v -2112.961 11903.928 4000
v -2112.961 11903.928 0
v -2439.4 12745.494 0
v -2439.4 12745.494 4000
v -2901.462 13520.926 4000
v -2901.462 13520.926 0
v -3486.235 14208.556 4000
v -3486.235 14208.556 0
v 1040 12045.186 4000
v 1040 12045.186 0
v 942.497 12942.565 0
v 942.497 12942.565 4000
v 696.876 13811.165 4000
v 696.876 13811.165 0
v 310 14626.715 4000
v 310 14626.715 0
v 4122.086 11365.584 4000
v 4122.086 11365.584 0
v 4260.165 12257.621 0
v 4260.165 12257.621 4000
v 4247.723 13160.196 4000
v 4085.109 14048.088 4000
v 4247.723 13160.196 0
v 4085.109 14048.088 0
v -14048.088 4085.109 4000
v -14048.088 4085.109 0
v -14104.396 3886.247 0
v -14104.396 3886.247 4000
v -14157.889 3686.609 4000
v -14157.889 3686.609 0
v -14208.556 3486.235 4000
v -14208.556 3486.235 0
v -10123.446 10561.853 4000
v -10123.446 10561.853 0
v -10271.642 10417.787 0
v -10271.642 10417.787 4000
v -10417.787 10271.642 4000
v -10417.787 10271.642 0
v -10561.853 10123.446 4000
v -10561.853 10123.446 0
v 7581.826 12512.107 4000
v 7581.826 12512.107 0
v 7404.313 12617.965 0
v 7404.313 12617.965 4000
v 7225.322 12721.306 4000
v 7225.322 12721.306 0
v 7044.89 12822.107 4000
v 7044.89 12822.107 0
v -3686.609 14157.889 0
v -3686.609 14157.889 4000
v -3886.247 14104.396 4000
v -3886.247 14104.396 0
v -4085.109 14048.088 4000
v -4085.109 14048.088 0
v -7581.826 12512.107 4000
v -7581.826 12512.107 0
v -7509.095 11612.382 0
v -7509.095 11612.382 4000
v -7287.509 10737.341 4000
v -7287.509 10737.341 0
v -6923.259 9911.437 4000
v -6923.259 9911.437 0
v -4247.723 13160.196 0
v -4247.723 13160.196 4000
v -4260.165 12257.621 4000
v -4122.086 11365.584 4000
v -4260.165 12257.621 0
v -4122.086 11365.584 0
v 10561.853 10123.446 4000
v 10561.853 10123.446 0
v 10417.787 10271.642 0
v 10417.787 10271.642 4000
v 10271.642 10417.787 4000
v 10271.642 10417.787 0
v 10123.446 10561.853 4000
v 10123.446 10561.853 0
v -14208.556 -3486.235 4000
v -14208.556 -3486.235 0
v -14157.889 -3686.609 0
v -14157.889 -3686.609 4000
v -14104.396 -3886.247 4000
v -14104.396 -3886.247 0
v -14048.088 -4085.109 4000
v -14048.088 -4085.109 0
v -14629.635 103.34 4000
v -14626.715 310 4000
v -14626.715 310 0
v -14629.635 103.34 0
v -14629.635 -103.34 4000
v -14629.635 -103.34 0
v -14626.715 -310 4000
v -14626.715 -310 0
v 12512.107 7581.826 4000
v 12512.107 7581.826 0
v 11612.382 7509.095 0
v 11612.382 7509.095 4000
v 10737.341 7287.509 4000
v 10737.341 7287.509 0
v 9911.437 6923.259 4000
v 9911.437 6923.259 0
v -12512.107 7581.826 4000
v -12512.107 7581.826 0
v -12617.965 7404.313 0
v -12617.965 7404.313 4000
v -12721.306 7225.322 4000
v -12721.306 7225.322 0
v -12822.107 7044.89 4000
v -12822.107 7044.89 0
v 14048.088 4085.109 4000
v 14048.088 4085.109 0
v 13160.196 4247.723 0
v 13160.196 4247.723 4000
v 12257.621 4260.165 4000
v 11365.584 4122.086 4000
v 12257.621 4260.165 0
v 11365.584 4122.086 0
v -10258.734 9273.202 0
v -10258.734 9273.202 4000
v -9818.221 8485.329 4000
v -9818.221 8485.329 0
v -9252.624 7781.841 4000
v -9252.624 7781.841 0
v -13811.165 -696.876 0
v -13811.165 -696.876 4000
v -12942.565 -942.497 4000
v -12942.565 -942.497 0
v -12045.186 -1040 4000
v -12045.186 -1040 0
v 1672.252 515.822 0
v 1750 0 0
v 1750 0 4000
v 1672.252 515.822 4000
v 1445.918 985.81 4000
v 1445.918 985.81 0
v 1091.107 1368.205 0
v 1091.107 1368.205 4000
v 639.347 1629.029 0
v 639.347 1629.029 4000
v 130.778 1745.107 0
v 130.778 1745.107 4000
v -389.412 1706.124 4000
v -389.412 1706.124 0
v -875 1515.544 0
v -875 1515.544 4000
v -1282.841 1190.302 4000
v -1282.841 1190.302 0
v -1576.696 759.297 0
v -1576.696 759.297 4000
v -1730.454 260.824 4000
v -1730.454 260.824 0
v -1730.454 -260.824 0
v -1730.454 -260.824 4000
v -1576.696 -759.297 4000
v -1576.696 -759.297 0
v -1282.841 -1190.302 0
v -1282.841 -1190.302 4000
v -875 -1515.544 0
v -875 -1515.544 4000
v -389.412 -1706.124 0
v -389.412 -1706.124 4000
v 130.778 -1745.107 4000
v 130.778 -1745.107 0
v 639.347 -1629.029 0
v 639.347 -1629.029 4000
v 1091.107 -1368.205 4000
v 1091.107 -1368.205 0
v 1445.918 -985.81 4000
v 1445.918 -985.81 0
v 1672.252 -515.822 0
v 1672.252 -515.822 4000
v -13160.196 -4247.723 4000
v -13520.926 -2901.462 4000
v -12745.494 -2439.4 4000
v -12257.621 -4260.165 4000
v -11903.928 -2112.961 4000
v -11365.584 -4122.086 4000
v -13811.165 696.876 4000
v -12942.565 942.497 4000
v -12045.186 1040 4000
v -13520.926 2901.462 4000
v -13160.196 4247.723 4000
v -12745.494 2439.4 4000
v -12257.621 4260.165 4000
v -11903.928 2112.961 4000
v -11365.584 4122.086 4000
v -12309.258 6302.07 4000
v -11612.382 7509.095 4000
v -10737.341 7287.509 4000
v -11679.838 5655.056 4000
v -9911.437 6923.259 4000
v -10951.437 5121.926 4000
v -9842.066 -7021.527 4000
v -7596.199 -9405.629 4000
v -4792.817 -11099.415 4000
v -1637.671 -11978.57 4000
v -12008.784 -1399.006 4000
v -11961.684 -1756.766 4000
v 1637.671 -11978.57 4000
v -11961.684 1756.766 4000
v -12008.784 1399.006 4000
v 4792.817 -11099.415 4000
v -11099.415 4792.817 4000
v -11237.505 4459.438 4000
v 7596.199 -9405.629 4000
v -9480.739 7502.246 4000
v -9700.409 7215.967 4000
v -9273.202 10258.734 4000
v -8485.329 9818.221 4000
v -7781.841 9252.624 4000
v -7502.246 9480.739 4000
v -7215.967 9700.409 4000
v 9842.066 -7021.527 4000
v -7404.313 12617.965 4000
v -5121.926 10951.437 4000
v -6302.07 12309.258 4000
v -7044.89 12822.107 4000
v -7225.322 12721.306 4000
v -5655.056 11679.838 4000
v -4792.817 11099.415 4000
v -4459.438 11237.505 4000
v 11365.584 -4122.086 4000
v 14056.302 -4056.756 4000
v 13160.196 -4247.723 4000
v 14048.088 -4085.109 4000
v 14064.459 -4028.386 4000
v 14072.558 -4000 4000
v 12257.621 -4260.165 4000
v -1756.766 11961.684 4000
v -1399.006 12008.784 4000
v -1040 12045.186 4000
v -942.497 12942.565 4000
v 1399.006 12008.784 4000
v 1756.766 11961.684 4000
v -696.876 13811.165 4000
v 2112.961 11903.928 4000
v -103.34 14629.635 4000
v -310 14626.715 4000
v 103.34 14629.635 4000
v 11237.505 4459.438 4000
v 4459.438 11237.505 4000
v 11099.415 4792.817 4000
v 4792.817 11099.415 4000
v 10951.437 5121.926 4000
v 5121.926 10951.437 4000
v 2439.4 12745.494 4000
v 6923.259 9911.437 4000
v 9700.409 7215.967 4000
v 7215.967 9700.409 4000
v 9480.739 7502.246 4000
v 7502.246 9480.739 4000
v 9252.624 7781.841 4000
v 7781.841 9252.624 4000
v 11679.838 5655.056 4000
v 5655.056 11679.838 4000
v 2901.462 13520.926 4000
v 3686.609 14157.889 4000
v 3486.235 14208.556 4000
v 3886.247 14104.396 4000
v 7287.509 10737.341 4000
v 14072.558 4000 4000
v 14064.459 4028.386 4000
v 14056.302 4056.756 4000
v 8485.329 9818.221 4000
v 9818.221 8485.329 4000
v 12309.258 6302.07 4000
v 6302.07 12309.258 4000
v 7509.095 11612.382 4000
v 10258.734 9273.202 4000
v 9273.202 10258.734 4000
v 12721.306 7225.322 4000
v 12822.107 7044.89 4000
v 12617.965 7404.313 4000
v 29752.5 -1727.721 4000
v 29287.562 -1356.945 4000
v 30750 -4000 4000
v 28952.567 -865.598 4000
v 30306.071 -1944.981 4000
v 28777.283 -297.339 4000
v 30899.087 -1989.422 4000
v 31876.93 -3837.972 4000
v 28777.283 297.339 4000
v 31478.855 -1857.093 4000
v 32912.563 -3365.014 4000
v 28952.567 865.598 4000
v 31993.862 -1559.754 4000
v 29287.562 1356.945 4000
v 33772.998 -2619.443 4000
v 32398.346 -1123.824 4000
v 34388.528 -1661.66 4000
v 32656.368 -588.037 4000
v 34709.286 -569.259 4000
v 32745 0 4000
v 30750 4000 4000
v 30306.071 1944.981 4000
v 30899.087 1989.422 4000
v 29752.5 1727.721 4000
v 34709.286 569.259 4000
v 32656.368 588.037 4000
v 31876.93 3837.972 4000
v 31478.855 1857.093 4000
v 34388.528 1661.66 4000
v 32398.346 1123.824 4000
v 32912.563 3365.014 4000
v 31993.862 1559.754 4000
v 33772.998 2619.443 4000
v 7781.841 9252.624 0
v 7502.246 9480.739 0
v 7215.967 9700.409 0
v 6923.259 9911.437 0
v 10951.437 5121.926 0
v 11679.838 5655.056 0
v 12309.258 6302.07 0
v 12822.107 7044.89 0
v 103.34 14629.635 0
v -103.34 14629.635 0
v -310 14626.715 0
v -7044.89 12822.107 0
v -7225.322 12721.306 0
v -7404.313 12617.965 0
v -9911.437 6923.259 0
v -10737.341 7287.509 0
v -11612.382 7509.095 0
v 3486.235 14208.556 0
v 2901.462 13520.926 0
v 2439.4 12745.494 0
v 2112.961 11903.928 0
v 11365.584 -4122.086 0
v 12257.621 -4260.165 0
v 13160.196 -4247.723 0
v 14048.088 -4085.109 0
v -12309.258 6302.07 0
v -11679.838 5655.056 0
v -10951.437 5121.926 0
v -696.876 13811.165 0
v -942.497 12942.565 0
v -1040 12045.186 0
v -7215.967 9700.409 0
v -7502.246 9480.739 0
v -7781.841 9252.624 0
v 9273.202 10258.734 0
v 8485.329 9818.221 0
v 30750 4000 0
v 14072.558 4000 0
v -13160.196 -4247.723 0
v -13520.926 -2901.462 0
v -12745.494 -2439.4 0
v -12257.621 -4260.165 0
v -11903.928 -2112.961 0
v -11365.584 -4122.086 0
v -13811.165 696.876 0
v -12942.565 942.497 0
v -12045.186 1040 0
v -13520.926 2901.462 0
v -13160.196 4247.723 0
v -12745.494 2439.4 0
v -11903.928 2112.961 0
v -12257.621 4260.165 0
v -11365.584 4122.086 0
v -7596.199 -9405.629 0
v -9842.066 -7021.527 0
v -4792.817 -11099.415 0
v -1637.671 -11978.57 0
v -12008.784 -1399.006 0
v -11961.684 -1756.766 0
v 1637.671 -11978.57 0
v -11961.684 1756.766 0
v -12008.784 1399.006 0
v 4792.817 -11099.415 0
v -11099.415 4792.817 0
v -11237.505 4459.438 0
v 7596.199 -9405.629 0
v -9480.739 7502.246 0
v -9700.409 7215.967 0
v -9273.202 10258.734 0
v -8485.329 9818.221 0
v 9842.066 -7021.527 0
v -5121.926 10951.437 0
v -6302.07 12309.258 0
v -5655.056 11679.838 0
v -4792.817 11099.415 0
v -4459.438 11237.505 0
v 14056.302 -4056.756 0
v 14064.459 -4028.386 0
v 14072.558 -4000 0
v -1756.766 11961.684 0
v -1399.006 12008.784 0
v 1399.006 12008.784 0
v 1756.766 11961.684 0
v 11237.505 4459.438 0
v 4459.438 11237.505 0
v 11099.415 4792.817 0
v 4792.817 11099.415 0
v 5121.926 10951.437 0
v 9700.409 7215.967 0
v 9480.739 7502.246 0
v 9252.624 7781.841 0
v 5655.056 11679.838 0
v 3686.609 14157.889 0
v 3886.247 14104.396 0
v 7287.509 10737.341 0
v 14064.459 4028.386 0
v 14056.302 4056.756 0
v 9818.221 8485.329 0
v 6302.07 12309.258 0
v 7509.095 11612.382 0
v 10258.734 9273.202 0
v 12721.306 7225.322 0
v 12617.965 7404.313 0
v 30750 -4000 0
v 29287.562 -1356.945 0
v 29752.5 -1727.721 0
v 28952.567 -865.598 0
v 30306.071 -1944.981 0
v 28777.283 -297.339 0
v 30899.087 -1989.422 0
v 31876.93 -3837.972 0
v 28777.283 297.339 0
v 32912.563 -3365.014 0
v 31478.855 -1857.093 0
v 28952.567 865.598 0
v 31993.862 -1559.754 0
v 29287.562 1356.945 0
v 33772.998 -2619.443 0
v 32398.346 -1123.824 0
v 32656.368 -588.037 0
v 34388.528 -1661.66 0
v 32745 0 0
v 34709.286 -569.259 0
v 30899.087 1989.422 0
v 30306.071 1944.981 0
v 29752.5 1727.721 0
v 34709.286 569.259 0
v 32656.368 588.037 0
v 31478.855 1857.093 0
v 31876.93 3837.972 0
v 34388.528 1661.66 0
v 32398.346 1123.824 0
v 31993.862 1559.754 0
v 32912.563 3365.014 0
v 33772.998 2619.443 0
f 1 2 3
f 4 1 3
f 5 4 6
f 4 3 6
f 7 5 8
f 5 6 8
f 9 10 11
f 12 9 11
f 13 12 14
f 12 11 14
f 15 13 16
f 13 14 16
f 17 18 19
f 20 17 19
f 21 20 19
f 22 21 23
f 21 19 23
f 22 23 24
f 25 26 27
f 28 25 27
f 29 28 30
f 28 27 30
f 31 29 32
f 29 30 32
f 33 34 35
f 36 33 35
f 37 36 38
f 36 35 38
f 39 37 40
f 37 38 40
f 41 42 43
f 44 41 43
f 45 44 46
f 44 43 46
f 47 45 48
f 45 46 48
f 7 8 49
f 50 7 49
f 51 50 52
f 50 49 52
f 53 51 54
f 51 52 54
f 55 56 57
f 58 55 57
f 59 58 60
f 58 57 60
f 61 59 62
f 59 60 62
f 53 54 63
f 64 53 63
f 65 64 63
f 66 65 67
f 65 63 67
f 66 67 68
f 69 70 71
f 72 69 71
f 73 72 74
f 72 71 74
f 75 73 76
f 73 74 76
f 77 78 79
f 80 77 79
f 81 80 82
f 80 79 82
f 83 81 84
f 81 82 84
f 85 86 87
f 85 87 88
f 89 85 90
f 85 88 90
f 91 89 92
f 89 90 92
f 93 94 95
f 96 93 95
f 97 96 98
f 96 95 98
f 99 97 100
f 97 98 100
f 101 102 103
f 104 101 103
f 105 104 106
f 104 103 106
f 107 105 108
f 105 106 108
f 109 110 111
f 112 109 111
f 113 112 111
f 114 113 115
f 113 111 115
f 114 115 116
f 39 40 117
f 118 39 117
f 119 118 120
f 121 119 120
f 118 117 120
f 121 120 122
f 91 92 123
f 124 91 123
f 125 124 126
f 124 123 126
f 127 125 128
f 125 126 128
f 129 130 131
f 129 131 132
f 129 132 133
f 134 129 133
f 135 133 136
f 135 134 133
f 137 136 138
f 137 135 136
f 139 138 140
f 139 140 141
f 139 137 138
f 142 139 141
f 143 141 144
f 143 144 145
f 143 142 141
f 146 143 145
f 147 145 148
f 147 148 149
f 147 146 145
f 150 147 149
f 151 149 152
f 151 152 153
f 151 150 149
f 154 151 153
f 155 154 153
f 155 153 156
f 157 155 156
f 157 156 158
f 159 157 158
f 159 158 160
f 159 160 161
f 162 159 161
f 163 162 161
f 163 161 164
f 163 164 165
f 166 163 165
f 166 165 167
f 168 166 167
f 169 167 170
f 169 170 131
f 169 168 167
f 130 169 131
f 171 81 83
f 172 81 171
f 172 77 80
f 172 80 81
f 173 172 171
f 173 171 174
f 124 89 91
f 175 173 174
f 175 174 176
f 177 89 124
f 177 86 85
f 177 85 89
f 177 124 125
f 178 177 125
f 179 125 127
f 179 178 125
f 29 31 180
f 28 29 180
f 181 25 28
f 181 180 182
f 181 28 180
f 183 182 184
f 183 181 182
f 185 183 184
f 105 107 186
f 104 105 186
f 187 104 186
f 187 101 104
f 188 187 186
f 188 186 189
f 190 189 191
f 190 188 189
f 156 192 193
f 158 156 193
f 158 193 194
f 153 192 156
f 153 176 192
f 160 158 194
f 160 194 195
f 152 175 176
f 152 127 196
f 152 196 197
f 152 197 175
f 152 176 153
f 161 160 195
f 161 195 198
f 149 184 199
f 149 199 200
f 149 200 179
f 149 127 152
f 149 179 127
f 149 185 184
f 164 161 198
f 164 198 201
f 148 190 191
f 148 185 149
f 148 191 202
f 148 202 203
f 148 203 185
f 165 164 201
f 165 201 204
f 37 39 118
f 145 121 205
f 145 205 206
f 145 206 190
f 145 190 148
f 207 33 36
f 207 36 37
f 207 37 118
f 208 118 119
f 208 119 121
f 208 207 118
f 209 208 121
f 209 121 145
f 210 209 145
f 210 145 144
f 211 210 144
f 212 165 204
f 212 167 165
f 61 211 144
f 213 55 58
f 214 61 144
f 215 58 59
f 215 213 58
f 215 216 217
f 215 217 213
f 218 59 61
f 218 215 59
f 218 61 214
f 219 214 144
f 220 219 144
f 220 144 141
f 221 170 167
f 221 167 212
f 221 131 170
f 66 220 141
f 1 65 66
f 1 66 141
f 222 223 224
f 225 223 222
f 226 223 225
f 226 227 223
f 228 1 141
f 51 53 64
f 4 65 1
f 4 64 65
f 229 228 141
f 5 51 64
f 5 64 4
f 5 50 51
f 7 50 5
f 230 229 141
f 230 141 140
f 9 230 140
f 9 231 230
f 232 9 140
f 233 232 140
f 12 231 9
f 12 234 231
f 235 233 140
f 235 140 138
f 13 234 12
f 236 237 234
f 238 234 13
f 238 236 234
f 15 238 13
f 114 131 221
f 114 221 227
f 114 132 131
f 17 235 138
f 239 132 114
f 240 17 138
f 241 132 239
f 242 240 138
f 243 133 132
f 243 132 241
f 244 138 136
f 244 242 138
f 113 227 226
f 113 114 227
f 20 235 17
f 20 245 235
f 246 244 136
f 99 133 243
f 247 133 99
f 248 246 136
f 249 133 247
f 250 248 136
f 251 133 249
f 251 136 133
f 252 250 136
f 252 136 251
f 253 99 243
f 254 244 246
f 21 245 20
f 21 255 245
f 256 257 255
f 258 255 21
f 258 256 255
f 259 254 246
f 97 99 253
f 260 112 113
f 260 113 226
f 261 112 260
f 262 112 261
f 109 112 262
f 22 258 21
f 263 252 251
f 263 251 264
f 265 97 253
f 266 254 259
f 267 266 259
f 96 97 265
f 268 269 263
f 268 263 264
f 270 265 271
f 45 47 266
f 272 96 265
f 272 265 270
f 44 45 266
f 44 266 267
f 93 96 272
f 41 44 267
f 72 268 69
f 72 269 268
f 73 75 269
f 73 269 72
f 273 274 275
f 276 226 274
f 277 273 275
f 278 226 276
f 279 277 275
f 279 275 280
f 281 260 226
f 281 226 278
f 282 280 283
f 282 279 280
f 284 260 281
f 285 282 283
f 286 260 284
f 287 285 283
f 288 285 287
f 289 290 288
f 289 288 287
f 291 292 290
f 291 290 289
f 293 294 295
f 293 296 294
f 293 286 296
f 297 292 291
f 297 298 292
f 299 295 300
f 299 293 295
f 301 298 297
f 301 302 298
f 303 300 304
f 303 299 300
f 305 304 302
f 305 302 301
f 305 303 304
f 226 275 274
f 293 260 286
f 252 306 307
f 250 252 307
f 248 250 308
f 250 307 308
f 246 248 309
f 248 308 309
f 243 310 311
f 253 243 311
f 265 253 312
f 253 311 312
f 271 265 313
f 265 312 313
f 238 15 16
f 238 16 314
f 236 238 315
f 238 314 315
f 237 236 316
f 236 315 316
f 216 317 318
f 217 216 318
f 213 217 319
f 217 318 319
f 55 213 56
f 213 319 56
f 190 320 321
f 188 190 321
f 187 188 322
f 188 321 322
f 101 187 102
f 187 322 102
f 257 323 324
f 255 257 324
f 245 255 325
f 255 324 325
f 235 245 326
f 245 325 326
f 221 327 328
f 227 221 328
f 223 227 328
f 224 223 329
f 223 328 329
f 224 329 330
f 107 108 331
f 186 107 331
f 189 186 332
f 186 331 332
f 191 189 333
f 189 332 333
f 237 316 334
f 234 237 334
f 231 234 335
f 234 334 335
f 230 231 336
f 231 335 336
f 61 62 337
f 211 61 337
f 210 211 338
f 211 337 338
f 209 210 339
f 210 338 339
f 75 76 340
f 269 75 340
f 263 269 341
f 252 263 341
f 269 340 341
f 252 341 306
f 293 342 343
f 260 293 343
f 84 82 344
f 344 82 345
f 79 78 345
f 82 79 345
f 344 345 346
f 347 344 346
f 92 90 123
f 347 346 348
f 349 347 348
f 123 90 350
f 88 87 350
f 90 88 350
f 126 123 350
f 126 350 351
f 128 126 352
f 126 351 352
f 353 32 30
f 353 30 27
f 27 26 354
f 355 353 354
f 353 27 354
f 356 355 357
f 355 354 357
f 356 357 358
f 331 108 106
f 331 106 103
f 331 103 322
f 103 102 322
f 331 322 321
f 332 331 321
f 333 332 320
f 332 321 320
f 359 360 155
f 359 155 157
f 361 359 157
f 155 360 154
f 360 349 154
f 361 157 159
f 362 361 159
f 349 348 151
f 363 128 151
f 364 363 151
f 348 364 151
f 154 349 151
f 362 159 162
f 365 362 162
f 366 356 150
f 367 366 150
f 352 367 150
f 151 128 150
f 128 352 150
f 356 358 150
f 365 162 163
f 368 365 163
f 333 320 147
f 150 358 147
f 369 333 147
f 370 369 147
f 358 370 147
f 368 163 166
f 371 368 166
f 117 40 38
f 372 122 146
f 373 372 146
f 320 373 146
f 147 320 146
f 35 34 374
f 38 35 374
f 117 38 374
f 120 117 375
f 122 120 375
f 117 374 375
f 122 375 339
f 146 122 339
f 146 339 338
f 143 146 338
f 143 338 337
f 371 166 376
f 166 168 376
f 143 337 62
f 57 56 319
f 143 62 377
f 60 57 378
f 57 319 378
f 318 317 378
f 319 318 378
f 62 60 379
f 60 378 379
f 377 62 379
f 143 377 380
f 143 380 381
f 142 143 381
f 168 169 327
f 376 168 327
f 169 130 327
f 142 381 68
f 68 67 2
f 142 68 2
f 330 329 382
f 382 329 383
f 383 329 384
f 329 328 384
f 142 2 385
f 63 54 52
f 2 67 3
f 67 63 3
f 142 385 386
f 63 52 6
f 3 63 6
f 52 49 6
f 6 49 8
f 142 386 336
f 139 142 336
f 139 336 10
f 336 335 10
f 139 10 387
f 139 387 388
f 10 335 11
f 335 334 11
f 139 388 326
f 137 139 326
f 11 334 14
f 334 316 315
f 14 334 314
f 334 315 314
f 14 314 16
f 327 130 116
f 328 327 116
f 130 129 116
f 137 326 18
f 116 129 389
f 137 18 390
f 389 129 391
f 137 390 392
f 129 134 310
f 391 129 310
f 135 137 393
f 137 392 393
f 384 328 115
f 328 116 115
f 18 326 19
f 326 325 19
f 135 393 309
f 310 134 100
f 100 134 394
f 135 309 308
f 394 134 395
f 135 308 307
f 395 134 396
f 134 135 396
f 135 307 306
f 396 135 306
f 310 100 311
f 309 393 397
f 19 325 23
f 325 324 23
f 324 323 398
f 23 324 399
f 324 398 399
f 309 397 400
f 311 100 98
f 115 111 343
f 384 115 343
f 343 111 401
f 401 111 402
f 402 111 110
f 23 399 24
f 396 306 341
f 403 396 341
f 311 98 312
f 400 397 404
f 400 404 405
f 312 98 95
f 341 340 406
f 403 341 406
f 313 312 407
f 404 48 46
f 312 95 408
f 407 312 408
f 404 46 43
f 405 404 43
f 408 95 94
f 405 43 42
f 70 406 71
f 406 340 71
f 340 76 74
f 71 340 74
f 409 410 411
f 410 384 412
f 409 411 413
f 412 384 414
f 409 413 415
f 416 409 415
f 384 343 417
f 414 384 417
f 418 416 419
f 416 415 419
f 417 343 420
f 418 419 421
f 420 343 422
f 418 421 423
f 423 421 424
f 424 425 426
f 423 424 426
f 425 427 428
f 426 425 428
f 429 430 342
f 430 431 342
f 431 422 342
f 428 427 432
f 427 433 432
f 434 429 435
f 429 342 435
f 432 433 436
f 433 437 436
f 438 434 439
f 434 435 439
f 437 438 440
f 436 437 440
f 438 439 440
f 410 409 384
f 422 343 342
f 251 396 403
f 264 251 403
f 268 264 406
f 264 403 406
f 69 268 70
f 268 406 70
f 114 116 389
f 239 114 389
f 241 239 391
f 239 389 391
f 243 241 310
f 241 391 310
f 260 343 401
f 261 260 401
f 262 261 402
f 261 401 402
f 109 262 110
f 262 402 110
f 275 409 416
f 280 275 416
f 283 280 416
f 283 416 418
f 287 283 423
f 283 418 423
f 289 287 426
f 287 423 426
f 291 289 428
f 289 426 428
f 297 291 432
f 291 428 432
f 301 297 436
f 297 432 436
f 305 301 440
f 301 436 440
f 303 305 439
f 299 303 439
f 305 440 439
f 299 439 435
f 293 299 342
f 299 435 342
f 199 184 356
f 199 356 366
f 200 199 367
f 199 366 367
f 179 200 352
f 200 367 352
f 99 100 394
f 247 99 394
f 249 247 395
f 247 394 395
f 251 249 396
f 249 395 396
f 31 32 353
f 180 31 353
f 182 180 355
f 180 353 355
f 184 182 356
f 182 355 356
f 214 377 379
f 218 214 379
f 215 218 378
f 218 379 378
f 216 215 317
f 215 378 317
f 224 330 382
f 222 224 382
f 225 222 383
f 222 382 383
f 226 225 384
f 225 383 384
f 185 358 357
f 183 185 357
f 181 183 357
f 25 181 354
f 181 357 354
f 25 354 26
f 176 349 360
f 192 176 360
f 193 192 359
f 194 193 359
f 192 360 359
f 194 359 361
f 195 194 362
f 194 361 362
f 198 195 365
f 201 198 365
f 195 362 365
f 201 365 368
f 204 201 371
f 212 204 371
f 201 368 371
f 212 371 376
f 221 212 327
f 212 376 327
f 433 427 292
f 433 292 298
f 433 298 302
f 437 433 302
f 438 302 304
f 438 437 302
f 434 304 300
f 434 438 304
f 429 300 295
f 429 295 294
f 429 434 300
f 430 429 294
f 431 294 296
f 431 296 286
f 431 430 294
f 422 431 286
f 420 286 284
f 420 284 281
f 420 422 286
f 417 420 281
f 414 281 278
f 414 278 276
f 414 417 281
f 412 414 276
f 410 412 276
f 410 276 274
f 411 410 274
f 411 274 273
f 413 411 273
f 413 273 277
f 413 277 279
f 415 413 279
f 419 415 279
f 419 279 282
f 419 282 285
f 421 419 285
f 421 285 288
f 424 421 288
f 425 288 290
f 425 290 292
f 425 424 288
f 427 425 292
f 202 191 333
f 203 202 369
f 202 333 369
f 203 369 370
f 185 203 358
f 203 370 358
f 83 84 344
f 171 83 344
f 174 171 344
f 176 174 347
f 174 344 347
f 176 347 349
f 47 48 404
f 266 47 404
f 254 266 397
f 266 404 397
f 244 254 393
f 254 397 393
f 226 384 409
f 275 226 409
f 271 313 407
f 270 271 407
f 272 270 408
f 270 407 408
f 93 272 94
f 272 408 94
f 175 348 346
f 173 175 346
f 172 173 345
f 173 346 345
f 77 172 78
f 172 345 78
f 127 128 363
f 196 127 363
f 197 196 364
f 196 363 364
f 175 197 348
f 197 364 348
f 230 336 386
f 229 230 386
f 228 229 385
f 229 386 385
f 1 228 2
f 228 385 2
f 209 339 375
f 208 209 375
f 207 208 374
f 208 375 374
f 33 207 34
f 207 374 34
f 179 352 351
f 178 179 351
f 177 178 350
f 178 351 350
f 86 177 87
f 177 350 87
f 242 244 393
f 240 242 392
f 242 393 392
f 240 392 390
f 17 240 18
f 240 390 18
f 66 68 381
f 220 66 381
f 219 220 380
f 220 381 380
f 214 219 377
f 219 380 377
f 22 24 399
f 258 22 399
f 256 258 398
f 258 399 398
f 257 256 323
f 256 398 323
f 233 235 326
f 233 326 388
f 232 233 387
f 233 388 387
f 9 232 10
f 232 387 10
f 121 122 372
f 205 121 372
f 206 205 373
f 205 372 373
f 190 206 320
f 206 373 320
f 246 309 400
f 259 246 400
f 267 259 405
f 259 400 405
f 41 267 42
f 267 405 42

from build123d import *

# Parameters (mm, degrees)
SKETCH2_R           = 1750
SKETCH2_R_2         = 1995
BOSS_EXTRUDE1_DEPTH = 4000


with BuildPart() as part:
    # Sketch2 → Boss-Extrude1 (new body)
    with BuildSketch(Plane.XY):
        with BuildLine():
            Line((14072.558402792, -4000), (30750, -4000))
            ThreePointArc((30750, -4000), (34750, 0), (30750, 4000))
            Line((30750, 4000), (14072.558402792, 4000))
            ThreePointArc((14072.558402792, 4000), (14060.387670314, 4042.573259754), (14048.088142637, 4085.109488948))
            ThreePointArc((14048.088142637, 4085.109488948), (12709.169027193, 4272.836062793), (11365.584201411, 4122.086335903))
            ThreePointArc((11365.584201411, 4122.086335903), (11169.703548061, 4626.642697294), (10951.436861718, 5121.926460211))
            ThreePointArc((10951.436861718, 5121.926460211), (12008.090957274, 5965.388247475), (12822.10700989, 7044.889766841))
            ThreePointArc((12822.10700989, 7044.889766841), (12669.951657366, 7315), (12512.10700989, 7581.825517187))
            ThreePointArc((12512.10700989, 7581.825517187), (11170.223244387, 7416.617696216), (9911.436861718, 6923.259300083))
            ThreePointArc((9911.436861718, 6923.259300083), (9591.641884121, 7359.925676715), (9252.62358419, 7781.841479322))
            ThreePointArc((9252.62358419, 7781.841479322), (10054.969090182, 8870.045207143), (10561.852665989, 10123.446461653))
            ThreePointArc((10561.852665989, 10123.446461653), (10344.972208759, 10344.972208759), (10123.446461653, 10561.852665989))
            ThreePointArc((10123.446461653, 10561.852665989), (8870.045207143, 10054.969090182), (7781.841479322, 9252.62358419))
            ThreePointArc((7781.841479322, 9252.62358419), (7359.925676715, 9591.641884121), (6923.259300083, 9911.436861718))
            ThreePointArc((6923.259300083, 9911.436861718), (7416.617696216, 11170.223244387), (7581.825517187, 12512.10700989))
            ThreePointArc((7581.825517187, 12512.10700989), (7315, 12669.951657366), (7044.889766841, 12822.10700989))
            ThreePointArc((7044.889766841, 12822.10700989), (5965.388247475, 12008.090957274), (5121.926460211, 10951.436861718))
            ThreePointArc((5121.926460211, 10951.436861718), (4626.642697294, 11169.703548061), (4122.086335903, 11365.584201411))
            ThreePointArc((4122.086335903, 11365.584201411), (4272.836062793, 12709.169027193), (4085.109488948, 14048.088142637))
            ThreePointArc((4085.109488948, 14048.088142637), (3786.52262985, 14131.494838609), (3486.235476649, 14208.555950601))
            ThreePointArc((3486.235476649, 14208.555950601), (2654.199937011, 13142.881269936), (2112.960617221, 11903.927815224))
            ThreePointArc((2112.960617221, 11903.927815224), (1578.06166394, 11986.568374009), (1040, 12045.185760294))
            ThreePointArc((1040, 12045.185760294), (837.867712887, 13382.005943691), (310, 14626.715284027))
            ThreePointArc((310, 14626.715284027), (0, 14630), (-310, 14626.715284027))
            ThreePointArc((-310, 14626.715284027), (-837.867712887, 13382.005943691), (-1040, 12045.185760294))
            ThreePointArc((-1040, 12045.185760294), (-1578.06166394, 11986.568374009), (-2112.960617221, 11903.927815224))
            ThreePointArc((-2112.960617221, 11903.927815224), (-2654.199937011, 13142.881269936), (-3486.235476649, 14208.555950601))
            ThreePointArc((-3486.235476649, 14208.555950601), (-3786.52262985, 14131.494838609), (-4085.109488948, 14048.088142637))
            ThreePointArc((-4085.109488948, 14048.088142637), (-4272.836062793, 12709.169027193), (-4122.086335903, 11365.584201411))
            ThreePointArc((-4122.086335903, 11365.584201411), (-4626.642697294, 11169.703548061), (-5121.926460211, 10951.436861718))
            ThreePointArc((-5121.926460211, 10951.436861718), (-5965.388247475, 12008.090957274), (-7044.889766841, 12822.10700989))
            ThreePointArc((-7044.889766841, 12822.10700989), (-7315, 12669.951657366), (-7581.825517187, 12512.10700989))
            ThreePointArc((-7581.825517187, 12512.10700989), (-7416.617696216, 11170.223244387), (-6923.259300083, 9911.436861718))
            ThreePointArc((-6923.259300083, 9911.436861718), (-7359.925676715, 9591.641884121), (-7781.841479322, 9252.62358419))
            ThreePointArc((-7781.841479322, 9252.62358419), (-8870.045207143, 10054.969090182), (-10123.446461653, 10561.852665989))
            ThreePointArc((-10123.446461653, 10561.852665989), (-10344.972208759, 10344.972208759), (-10561.852665989, 10123.446461653))
            ThreePointArc((-10561.852665989, 10123.446461653), (-10054.969090182, 8870.045207143), (-9252.62358419, 7781.841479322))
            ThreePointArc((-9252.62358419, 7781.841479322), (-9591.641884121, 7359.925676715), (-9911.436861718, 6923.259300083))
            ThreePointArc((-9911.436861718, 6923.259300083), (-11170.223244387, 7416.617696216), (-12512.10700989, 7581.825517187))
            ThreePointArc((-12512.10700989, 7581.825517187), (-12669.951657366, 7315), (-12822.10700989, 7044.889766841))
            ThreePointArc((-12822.10700989, 7044.889766841), (-12008.090957274, 5965.388247475), (-10951.436861718, 5121.926460211))
            ThreePointArc((-10951.436861718, 5121.926460211), (-11169.703548061, 4626.642697294), (-11365.584201411, 4122.086335903))
            ThreePointArc((-11365.584201411, 4122.086335903), (-12709.169027193, 4272.836062793), (-14048.088142637, 4085.109488948))
            ThreePointArc((-14048.088142637, 4085.109488948), (-14131.494838609, 3786.52262985), (-14208.555950601, 3486.235476649))
            ThreePointArc((-14208.555950601, 3486.235476649), (-13142.881269936, 2654.199937011), (-11903.927815224, 2112.960617221))
            ThreePointArc((-11903.927815224, 2112.960617221), (-11986.568374009, 1578.06166394), (-12045.185760294, 1040))
            ThreePointArc((-12045.185760294, 1040), (-13382.005943691, 837.867712887), (-14626.715284027, 310))
            ThreePointArc((-14626.715284027, 310), (-14630, 0), (-14626.715284027, -310))
            ThreePointArc((-14626.715284027, -310), (-13382.005943691, -837.867712887), (-12045.185760294, -1040))
            ThreePointArc((-12045.185760294, -1040), (-11986.568374009, -1578.06166394), (-11903.927815224, -2112.960617221))
            ThreePointArc((-11903.927815224, -2112.960617221), (-13142.881269936, -2654.199937011), (-14208.555950601, -3486.235476649))
            ThreePointArc((-14208.555950601, -3486.235476649), (-14131.494838609, -3786.52262985), (-14048.088142637, -4085.109488948))
            ThreePointArc((-14048.088142637, -4085.109488948), (-12709.169027193, -4272.836062793), (-11365.584201411, -4122.086335903))
            ThreePointArc((-11365.584201411, -4122.086335903), (0, -12090), (11365.584201411, -4122.086335903))
            ThreePointArc((11365.584201411, -4122.086335903), (12709.169027193, -4272.836062793), (14048.088142637, -4085.109488948))
            ThreePointArc((14048.088142637, -4085.109488948), (14060.387670314, -4042.573259754), (14072.558402792, -4000))
        make_face()
        Circle(SKETCH2_R, mode=Mode.SUBTRACT)
        with Locations((30750, 0)):
            Circle(SKETCH2_R_2, mode=Mode.SUBTRACT)
    extrude(amount=BOSS_EXTRUDE1_DEPTH)


solid = part.part
